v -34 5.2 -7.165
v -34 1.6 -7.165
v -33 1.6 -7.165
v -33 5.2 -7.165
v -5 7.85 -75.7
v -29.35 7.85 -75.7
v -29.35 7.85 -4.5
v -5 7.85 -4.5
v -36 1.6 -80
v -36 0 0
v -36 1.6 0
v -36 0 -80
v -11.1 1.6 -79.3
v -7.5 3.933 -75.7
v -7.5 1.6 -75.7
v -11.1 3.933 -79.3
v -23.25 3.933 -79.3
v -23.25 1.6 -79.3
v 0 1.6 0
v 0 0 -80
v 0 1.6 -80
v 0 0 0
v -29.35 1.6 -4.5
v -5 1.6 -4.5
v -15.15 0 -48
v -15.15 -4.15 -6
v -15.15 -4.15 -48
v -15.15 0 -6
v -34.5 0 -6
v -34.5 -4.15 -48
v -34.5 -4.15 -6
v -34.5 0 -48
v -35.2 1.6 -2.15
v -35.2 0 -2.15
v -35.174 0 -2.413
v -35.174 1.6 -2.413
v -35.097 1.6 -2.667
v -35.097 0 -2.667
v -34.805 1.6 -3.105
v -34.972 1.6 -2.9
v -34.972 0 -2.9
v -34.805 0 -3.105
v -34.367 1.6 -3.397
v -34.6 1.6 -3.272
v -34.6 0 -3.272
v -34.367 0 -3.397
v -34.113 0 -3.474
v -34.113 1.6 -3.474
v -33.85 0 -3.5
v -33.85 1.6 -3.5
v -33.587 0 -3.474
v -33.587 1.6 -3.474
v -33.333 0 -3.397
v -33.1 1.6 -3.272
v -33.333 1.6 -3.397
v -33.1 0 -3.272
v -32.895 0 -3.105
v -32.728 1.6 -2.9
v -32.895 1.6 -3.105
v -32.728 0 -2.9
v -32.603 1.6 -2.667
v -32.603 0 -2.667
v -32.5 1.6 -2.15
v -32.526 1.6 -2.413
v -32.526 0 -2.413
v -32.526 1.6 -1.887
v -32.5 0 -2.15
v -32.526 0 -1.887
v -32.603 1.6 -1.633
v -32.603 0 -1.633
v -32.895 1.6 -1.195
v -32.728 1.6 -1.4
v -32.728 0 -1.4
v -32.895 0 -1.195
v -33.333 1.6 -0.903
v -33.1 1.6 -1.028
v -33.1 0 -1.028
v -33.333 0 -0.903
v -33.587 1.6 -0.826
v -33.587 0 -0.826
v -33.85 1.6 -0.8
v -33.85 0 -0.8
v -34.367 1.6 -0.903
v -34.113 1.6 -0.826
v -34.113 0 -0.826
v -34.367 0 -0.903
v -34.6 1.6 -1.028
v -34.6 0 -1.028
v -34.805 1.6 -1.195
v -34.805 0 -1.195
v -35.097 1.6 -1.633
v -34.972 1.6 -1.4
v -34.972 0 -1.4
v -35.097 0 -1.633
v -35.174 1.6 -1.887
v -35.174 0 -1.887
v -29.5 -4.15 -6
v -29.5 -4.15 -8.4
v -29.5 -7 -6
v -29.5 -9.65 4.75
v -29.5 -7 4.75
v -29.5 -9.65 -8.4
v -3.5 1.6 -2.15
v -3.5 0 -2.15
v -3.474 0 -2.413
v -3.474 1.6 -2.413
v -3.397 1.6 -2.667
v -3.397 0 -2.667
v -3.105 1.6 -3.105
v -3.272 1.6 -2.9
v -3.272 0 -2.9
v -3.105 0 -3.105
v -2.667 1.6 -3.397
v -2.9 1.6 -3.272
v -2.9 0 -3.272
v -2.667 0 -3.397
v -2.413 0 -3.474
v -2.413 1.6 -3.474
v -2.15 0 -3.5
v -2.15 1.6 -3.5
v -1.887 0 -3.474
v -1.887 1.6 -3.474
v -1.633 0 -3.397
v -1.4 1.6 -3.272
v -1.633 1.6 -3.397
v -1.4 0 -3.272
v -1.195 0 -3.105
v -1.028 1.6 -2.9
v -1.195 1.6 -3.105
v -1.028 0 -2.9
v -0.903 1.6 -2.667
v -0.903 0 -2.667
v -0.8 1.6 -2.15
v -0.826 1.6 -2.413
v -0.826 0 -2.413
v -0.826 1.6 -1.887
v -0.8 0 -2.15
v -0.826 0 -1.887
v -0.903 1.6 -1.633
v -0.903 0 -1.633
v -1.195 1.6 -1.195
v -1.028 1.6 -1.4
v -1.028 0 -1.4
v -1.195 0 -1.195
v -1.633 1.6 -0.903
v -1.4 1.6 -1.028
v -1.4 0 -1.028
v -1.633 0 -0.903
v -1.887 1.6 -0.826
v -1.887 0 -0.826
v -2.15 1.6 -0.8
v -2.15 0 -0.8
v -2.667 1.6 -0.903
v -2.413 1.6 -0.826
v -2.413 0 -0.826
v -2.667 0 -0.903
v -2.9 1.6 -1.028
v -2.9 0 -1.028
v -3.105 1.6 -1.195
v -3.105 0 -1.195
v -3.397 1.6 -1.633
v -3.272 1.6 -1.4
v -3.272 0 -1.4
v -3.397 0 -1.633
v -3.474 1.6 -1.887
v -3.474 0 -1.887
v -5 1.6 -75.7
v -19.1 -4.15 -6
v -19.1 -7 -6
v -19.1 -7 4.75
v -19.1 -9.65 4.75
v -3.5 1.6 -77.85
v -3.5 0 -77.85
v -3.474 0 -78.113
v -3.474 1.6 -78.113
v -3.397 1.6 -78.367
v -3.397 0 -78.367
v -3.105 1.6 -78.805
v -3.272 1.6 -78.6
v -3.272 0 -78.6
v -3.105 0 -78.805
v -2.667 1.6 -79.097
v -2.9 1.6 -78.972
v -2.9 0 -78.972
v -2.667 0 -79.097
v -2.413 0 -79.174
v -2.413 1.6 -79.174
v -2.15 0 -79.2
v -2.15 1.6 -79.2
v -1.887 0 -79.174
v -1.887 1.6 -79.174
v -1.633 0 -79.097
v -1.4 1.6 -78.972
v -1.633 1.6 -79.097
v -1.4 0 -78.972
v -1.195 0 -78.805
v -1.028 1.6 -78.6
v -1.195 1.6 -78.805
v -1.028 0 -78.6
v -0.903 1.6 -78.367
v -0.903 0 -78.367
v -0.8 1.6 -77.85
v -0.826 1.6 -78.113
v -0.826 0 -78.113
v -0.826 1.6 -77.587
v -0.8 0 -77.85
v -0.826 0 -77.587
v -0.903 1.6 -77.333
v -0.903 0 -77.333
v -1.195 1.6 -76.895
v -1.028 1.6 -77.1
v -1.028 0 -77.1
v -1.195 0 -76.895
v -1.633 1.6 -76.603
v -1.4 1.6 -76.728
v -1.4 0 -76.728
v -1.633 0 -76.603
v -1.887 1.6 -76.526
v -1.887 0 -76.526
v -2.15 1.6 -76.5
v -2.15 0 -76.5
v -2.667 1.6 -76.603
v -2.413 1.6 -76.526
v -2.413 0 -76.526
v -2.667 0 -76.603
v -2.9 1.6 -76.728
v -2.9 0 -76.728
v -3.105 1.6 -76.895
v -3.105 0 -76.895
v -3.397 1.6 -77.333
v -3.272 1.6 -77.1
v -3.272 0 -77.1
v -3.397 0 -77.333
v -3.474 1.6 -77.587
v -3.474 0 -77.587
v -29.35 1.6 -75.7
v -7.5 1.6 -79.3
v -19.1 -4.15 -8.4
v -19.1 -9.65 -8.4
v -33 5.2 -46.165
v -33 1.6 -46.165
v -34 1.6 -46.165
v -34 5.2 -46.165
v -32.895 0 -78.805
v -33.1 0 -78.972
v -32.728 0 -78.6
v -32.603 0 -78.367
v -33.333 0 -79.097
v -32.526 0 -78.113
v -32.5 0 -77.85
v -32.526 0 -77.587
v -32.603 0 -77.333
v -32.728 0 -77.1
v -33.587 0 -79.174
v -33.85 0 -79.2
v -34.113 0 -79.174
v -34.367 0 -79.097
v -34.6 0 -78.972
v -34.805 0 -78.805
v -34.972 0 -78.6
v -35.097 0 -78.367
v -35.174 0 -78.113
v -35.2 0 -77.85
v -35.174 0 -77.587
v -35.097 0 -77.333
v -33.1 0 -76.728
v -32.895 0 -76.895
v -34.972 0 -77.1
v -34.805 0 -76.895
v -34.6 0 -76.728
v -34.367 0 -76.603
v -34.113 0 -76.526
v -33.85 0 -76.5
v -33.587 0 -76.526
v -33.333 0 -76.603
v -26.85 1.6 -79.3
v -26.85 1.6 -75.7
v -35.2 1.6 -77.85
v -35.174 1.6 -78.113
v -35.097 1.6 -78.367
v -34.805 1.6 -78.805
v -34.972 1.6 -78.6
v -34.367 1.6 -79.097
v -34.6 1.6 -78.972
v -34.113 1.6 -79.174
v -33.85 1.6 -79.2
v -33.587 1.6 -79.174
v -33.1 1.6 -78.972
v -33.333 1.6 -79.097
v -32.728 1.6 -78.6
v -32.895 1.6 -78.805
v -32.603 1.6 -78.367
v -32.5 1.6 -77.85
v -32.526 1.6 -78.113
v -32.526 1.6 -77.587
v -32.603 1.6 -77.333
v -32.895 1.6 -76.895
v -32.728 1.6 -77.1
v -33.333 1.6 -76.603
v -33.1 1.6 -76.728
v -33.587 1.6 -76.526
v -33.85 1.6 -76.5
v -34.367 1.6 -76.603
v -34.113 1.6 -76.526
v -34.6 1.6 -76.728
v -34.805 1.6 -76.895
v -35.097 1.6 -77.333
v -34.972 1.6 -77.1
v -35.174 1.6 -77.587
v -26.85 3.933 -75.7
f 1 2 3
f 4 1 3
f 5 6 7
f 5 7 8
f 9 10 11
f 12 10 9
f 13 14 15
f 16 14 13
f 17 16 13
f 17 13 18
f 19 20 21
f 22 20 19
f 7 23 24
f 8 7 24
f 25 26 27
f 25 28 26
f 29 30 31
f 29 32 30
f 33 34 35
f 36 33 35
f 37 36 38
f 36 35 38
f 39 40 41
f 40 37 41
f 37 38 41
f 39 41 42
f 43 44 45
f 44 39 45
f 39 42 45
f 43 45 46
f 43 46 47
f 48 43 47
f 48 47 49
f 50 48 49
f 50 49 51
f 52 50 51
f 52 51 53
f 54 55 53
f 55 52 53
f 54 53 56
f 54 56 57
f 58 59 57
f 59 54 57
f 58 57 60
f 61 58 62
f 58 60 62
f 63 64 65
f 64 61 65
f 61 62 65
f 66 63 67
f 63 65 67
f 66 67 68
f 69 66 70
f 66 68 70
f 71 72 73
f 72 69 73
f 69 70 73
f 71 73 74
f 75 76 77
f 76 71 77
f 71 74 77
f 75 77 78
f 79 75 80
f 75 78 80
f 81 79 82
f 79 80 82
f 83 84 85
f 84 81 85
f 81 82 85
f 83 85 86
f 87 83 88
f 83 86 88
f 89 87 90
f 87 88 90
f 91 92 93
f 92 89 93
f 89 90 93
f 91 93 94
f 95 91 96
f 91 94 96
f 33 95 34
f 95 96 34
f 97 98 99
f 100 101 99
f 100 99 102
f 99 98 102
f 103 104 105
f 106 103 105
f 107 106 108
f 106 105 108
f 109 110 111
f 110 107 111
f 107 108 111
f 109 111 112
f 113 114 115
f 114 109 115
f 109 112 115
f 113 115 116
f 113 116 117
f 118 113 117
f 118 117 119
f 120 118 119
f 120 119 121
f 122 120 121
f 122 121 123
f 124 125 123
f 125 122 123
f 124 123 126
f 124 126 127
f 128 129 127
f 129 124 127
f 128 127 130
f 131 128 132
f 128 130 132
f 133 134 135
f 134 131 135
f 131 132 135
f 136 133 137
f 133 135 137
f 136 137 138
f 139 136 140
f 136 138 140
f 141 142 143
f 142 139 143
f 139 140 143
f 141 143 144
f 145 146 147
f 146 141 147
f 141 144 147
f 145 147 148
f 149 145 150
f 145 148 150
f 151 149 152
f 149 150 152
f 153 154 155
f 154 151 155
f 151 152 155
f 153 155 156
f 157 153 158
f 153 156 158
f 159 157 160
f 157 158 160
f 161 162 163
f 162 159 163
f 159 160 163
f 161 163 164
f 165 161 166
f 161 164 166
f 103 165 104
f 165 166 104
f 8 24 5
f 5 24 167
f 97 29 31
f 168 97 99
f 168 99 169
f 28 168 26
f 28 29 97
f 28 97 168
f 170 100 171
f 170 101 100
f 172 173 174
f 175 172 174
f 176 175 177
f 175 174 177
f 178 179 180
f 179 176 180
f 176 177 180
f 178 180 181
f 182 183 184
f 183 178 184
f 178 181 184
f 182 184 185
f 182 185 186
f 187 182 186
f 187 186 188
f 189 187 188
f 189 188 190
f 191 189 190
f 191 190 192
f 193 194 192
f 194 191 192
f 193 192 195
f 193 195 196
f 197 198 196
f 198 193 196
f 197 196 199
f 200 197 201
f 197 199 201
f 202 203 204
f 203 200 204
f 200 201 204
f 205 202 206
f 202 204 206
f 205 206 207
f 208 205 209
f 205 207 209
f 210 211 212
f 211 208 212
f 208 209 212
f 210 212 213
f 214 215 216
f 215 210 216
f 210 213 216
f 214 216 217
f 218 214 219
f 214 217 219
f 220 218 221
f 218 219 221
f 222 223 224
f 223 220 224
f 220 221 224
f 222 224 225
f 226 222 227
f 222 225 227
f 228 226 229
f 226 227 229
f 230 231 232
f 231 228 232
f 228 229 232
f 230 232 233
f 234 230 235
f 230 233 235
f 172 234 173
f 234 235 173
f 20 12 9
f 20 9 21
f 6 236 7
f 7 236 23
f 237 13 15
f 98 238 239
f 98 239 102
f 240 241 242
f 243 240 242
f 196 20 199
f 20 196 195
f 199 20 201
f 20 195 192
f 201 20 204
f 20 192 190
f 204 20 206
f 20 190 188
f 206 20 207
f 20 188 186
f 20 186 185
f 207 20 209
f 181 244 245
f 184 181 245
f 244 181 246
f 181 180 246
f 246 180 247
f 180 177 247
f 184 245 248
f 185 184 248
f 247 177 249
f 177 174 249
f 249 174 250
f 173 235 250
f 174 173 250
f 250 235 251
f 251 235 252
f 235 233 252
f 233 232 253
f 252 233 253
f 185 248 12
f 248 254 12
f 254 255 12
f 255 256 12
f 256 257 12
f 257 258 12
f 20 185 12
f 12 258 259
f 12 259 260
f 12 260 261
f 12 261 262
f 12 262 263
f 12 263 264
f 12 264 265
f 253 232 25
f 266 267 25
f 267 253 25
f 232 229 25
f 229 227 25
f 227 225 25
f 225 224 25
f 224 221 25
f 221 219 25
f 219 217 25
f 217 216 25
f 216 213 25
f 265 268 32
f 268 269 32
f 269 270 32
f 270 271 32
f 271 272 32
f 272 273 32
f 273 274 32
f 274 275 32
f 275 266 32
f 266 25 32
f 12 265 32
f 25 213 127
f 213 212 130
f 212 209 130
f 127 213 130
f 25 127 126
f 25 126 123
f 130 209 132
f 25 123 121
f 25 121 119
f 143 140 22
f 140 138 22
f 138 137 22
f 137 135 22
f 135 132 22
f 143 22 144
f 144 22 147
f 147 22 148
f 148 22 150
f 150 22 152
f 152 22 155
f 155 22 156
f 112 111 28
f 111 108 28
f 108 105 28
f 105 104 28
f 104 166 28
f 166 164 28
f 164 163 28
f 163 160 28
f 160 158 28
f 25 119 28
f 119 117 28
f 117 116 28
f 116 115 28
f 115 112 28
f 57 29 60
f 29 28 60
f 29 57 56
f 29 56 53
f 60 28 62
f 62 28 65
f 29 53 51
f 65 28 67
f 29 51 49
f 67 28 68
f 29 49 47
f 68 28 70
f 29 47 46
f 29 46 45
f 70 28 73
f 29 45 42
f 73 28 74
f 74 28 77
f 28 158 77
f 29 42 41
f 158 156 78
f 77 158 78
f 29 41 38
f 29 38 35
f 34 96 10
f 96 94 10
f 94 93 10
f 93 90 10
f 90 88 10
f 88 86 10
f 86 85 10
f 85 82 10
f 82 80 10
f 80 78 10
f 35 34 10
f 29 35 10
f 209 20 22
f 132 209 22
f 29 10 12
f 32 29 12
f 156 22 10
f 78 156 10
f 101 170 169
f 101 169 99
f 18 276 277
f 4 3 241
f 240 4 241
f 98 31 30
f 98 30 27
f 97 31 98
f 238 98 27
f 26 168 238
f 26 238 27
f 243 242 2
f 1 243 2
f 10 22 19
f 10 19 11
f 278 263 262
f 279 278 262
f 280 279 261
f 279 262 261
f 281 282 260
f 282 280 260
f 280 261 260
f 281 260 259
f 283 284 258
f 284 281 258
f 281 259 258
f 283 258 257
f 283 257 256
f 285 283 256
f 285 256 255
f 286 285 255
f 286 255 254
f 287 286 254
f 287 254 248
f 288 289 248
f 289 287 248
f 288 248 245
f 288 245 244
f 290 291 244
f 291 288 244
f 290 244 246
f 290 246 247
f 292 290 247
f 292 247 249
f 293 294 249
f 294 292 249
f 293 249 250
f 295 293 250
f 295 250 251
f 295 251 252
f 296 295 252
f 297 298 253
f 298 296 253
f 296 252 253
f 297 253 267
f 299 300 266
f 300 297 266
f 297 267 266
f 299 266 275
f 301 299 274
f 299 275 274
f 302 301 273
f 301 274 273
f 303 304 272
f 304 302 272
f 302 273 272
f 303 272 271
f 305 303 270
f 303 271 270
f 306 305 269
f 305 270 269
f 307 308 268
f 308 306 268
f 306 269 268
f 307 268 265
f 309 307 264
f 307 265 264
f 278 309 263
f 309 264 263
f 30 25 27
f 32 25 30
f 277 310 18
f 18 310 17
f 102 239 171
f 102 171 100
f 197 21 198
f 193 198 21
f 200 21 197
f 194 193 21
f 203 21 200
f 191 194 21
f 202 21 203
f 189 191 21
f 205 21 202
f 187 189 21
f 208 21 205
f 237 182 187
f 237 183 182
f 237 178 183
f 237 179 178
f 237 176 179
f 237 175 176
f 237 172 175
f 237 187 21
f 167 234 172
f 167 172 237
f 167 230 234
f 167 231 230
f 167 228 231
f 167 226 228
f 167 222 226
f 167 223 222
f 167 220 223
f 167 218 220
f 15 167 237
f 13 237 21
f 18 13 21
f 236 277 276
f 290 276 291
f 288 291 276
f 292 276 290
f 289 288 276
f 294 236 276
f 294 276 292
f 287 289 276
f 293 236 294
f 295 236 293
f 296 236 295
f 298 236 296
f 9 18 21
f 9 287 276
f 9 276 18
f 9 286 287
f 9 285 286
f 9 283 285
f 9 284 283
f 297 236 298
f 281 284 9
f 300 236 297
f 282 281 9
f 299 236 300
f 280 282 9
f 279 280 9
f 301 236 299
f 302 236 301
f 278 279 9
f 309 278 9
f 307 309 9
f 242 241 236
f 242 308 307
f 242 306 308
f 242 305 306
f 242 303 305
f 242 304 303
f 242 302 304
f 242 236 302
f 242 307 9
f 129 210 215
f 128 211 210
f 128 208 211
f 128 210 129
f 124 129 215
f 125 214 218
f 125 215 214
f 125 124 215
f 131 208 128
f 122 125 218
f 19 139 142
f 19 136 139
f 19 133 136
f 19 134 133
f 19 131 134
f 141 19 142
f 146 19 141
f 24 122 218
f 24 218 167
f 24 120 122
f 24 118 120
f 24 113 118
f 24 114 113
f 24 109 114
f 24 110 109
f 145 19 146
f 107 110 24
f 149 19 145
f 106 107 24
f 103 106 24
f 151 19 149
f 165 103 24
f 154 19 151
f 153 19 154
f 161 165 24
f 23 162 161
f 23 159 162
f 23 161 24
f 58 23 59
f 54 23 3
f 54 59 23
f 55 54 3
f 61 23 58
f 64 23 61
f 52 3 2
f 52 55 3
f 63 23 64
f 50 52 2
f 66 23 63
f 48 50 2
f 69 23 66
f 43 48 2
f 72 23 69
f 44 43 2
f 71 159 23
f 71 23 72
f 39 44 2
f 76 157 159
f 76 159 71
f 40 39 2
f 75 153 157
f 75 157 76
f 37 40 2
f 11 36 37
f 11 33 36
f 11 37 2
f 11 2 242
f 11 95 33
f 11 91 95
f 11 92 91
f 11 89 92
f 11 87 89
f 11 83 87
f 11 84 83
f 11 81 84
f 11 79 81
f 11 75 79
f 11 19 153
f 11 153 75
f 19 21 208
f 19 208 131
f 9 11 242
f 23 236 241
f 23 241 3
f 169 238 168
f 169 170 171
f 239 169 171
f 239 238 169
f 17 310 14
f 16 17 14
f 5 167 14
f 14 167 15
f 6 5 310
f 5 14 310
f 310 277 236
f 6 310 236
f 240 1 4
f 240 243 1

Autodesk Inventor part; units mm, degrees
ref_plane "YZ Plane" through (0, 0, 0) normal (1, 0, 0) x (0, 1, 0)
ref_plane "XZ Plane" through (0, 0, 0) normal (0, 1, 0) x (-1, 0, 0)
ref_plane "XY Plane" through (0, 0, 0) normal (0, 0, 1) x (1, 0, 0)
sketch "Sketch1" plane through (0, 0, 0) normal (0, 1, 0) x (-1, 0, 0)
  line L0 (0, 0) -> (36, 0)
  line L1 (36, 0) -> (36, -80)
  line L2 (36, -80) -> (0, -80)
  line L3 (0, -80) -> (0, 0)
  circle A0 centre (33.85, -77.85) radius 1.35
  circle A1 centre (2.15, -77.85) radius 1.35
  circle A2 centre (33.85, -2.15) radius 1.35
  circle A3 centre (2.15, -2.15) radius 1.35
  dimension "d0" = 36
  dimension "d1" = 80
  dimension "d2" = 2.7
  dimension "d3" = 2.15
  dimension "d4" = 2.15
  dimension "d5" = 2.7
  dimension "d6" = 2.15
  dimension "d7" = 2.7
  dimension "d8" = 2.15
  dimension "d9" = 2.7
extrude "Extrusion1" add sketch "Sketch1" along normal blind 1.6
sketch "Sketch2" plane through (0, 1.6, 0) normal (0, 1, 0) x (1, 0, 0)
  line L0 (-29.35, 4.5) -> (-5, 4.5)
  line L1 (-5, 4.5) -> (-5, 75.7)
  line L2 (-5, 75.7) -> (-29.35, 75.7)
  line L3 (-29.35, 75.7) -> (-29.35, 4.5)
  line L4 (-36, 0) -> (0, 0) projected
  line L5 (0, 0) -> (0, 80) projected
  dimension "d12" = 24.35
  dimension "d13" = 71.2
  dimension "d14" = 4.5
  dimension "d15" = 5
extrude "Extrusion2" add sketch "Sketch2" along normal blind 6.25
sketch "Sketch3" plane through (0, 1.6, 0) normal (0, 1, 0) x (1, 0, 0)
  line L0 (-34, 7.1651) -> (-33, 7.1651)
  line L1 (-33, 7.1651) -> (-33, 46.1651)
  line L2 (-33, 46.1651) -> (-34, 46.1651)
  line L3 (-34, 46.1651) -> (-34, 7.1651)
  line L4 (-36, 80) -> (-36, 0) projected
  point P0 (0, 0)
  dimension "d18" = 1
  dimension "d19" = 39
  dimension "d20" = 2
extrude "Extrusion3" add sketch "Sketch3" along normal blind 3.6
sketch "Sketch4" plane through (-5, 1.6, -75.7) normal (0, 0, -1) x (-1, 0, 0)
  line L0 (-5, 0) -> (31, 0) projected
  line L1 (2.5, 0) -> (21.85, 0)
  line L2 (21.85, 0) -> (21.85, 2.3329)
  line L3 (21.85, 2.3329) -> (2.5, 2.3329)
  line L4 (2.5, 2.3329) -> (2.5, 0)
  line L5 (0, 0) -> (0, 6.25) projected
  line L6 (24.35, 0) -> (24.35, 6.25) projected
  point P0 (-5, -1.6)
  dimension "d23" = 2.5
  dimension "d24" = 2.5
extrude "Extrusion4" add sketch "Sketch4" along normal blind 3.6
sketch "Sketch5" plane through (-26.85, 3.9329, -75.7) normal (0, 1, 0) x (1, 0, 0)
  line L0 (19.35, 0) -> (15.75, 3.6)
  line L1 (19.35, 0) -> (24.4412, 0) construction
  line L2 (0, 0) -> (3.6, 3.6)
  line L3 (0, 0) -> (5.0912, 0) construction
  line L4 (3.6, 3.6) -> (15.75, 3.6)
  line L5 (19.35, 3.6) -> (19.35, 0) projected
  line L6 (19.35, 0) -> (19.35, 3.6)
  line L7 (19.35, 3.6) -> (15.75, 3.6)
  line L8 (3.6, 3.6) -> (0, 3.6)
  line L9 (0, 0) -> (0, 3.6)
  line L10 (21.85, 0) -> (-2.5, 0) projected
  point P0 (26.85, -75.7)
  dimension "d27" = 135
  dimension "d28" = 45
extrude "Extrusion5" cut sketch "Sketch5" against normal blind 2.333 contours L0 L7 L5 | L9 L8 L2
sketch "Sketch6" plane through (0, 0, 0) normal (0, -1, 0) x (1, 0, 0)
  line L0 (-34.5, -6) -> (-15.15, -6)
  line L1 (-15.15, -6) -> (-15.15, -48)
  line L2 (-15.15, -48) -> (-34.5, -48)
  line L3 (-34.5, -48) -> (-34.5, -6)
  line L4 (-36, 0) -> (-36, -80) projected
  line L5 (0, 0) -> (-36, 0) projected
  dimension "d31" = 19.35
  dimension "d32" = 42
  dimension "d33" = 1.5
  dimension "d34" = 6
extrude "Extrusion6" add sketch "Sketch6" along normal blind 4.15
sketch "Sketch7" plane through (0, -4.15, 0) normal (0, -1, 0) x (1, 0, 0)
  line L0 (-15.15, -6) -> (-34.5, -6) projected
  line L1 (-29.5, -6) -> (-19.1, -6)
  line L2 (-19.1, -6) -> (-19.1, -8.4)
  line L3 (-19.1, -8.4) -> (-29.5, -8.4)
  line L4 (-29.5, -8.4) -> (-29.5, -6)
  line L5 (-34.5, -6) -> (-34.5, -48) projected
  point P0 (0, 0)
  dimension "d37" = 10.4
  dimension "d38" = 2.4
  dimension "d39" = 5
extrude "Extrusion7" add sketch "Sketch7" along normal blind 5.5
sketch "Sketch8" plane through (-34.5, 0, -6) normal (0, 0, 1) x (1, 0, 0)
  line L0 (15.4, -9.65) -> (5, -9.65) projected
  line L1 (15.4, -4.15) -> (15.4, -9.65) projected
  line L2 (5, -9.65) -> (15.4, -9.65)
  line L3 (15.4, -9.65) -> (15.4, -7)
  line L4 (15.4, -7) -> (5, -7)
  line L5 (5, -7) -> (5, -9.65)
  point P0 (34.5, 0)
  dimension "d42" = 2.65
extrude "Extrusion8" add sketch "Sketch8" along normal blind 10.75
properties part number "LCD_Screen"
